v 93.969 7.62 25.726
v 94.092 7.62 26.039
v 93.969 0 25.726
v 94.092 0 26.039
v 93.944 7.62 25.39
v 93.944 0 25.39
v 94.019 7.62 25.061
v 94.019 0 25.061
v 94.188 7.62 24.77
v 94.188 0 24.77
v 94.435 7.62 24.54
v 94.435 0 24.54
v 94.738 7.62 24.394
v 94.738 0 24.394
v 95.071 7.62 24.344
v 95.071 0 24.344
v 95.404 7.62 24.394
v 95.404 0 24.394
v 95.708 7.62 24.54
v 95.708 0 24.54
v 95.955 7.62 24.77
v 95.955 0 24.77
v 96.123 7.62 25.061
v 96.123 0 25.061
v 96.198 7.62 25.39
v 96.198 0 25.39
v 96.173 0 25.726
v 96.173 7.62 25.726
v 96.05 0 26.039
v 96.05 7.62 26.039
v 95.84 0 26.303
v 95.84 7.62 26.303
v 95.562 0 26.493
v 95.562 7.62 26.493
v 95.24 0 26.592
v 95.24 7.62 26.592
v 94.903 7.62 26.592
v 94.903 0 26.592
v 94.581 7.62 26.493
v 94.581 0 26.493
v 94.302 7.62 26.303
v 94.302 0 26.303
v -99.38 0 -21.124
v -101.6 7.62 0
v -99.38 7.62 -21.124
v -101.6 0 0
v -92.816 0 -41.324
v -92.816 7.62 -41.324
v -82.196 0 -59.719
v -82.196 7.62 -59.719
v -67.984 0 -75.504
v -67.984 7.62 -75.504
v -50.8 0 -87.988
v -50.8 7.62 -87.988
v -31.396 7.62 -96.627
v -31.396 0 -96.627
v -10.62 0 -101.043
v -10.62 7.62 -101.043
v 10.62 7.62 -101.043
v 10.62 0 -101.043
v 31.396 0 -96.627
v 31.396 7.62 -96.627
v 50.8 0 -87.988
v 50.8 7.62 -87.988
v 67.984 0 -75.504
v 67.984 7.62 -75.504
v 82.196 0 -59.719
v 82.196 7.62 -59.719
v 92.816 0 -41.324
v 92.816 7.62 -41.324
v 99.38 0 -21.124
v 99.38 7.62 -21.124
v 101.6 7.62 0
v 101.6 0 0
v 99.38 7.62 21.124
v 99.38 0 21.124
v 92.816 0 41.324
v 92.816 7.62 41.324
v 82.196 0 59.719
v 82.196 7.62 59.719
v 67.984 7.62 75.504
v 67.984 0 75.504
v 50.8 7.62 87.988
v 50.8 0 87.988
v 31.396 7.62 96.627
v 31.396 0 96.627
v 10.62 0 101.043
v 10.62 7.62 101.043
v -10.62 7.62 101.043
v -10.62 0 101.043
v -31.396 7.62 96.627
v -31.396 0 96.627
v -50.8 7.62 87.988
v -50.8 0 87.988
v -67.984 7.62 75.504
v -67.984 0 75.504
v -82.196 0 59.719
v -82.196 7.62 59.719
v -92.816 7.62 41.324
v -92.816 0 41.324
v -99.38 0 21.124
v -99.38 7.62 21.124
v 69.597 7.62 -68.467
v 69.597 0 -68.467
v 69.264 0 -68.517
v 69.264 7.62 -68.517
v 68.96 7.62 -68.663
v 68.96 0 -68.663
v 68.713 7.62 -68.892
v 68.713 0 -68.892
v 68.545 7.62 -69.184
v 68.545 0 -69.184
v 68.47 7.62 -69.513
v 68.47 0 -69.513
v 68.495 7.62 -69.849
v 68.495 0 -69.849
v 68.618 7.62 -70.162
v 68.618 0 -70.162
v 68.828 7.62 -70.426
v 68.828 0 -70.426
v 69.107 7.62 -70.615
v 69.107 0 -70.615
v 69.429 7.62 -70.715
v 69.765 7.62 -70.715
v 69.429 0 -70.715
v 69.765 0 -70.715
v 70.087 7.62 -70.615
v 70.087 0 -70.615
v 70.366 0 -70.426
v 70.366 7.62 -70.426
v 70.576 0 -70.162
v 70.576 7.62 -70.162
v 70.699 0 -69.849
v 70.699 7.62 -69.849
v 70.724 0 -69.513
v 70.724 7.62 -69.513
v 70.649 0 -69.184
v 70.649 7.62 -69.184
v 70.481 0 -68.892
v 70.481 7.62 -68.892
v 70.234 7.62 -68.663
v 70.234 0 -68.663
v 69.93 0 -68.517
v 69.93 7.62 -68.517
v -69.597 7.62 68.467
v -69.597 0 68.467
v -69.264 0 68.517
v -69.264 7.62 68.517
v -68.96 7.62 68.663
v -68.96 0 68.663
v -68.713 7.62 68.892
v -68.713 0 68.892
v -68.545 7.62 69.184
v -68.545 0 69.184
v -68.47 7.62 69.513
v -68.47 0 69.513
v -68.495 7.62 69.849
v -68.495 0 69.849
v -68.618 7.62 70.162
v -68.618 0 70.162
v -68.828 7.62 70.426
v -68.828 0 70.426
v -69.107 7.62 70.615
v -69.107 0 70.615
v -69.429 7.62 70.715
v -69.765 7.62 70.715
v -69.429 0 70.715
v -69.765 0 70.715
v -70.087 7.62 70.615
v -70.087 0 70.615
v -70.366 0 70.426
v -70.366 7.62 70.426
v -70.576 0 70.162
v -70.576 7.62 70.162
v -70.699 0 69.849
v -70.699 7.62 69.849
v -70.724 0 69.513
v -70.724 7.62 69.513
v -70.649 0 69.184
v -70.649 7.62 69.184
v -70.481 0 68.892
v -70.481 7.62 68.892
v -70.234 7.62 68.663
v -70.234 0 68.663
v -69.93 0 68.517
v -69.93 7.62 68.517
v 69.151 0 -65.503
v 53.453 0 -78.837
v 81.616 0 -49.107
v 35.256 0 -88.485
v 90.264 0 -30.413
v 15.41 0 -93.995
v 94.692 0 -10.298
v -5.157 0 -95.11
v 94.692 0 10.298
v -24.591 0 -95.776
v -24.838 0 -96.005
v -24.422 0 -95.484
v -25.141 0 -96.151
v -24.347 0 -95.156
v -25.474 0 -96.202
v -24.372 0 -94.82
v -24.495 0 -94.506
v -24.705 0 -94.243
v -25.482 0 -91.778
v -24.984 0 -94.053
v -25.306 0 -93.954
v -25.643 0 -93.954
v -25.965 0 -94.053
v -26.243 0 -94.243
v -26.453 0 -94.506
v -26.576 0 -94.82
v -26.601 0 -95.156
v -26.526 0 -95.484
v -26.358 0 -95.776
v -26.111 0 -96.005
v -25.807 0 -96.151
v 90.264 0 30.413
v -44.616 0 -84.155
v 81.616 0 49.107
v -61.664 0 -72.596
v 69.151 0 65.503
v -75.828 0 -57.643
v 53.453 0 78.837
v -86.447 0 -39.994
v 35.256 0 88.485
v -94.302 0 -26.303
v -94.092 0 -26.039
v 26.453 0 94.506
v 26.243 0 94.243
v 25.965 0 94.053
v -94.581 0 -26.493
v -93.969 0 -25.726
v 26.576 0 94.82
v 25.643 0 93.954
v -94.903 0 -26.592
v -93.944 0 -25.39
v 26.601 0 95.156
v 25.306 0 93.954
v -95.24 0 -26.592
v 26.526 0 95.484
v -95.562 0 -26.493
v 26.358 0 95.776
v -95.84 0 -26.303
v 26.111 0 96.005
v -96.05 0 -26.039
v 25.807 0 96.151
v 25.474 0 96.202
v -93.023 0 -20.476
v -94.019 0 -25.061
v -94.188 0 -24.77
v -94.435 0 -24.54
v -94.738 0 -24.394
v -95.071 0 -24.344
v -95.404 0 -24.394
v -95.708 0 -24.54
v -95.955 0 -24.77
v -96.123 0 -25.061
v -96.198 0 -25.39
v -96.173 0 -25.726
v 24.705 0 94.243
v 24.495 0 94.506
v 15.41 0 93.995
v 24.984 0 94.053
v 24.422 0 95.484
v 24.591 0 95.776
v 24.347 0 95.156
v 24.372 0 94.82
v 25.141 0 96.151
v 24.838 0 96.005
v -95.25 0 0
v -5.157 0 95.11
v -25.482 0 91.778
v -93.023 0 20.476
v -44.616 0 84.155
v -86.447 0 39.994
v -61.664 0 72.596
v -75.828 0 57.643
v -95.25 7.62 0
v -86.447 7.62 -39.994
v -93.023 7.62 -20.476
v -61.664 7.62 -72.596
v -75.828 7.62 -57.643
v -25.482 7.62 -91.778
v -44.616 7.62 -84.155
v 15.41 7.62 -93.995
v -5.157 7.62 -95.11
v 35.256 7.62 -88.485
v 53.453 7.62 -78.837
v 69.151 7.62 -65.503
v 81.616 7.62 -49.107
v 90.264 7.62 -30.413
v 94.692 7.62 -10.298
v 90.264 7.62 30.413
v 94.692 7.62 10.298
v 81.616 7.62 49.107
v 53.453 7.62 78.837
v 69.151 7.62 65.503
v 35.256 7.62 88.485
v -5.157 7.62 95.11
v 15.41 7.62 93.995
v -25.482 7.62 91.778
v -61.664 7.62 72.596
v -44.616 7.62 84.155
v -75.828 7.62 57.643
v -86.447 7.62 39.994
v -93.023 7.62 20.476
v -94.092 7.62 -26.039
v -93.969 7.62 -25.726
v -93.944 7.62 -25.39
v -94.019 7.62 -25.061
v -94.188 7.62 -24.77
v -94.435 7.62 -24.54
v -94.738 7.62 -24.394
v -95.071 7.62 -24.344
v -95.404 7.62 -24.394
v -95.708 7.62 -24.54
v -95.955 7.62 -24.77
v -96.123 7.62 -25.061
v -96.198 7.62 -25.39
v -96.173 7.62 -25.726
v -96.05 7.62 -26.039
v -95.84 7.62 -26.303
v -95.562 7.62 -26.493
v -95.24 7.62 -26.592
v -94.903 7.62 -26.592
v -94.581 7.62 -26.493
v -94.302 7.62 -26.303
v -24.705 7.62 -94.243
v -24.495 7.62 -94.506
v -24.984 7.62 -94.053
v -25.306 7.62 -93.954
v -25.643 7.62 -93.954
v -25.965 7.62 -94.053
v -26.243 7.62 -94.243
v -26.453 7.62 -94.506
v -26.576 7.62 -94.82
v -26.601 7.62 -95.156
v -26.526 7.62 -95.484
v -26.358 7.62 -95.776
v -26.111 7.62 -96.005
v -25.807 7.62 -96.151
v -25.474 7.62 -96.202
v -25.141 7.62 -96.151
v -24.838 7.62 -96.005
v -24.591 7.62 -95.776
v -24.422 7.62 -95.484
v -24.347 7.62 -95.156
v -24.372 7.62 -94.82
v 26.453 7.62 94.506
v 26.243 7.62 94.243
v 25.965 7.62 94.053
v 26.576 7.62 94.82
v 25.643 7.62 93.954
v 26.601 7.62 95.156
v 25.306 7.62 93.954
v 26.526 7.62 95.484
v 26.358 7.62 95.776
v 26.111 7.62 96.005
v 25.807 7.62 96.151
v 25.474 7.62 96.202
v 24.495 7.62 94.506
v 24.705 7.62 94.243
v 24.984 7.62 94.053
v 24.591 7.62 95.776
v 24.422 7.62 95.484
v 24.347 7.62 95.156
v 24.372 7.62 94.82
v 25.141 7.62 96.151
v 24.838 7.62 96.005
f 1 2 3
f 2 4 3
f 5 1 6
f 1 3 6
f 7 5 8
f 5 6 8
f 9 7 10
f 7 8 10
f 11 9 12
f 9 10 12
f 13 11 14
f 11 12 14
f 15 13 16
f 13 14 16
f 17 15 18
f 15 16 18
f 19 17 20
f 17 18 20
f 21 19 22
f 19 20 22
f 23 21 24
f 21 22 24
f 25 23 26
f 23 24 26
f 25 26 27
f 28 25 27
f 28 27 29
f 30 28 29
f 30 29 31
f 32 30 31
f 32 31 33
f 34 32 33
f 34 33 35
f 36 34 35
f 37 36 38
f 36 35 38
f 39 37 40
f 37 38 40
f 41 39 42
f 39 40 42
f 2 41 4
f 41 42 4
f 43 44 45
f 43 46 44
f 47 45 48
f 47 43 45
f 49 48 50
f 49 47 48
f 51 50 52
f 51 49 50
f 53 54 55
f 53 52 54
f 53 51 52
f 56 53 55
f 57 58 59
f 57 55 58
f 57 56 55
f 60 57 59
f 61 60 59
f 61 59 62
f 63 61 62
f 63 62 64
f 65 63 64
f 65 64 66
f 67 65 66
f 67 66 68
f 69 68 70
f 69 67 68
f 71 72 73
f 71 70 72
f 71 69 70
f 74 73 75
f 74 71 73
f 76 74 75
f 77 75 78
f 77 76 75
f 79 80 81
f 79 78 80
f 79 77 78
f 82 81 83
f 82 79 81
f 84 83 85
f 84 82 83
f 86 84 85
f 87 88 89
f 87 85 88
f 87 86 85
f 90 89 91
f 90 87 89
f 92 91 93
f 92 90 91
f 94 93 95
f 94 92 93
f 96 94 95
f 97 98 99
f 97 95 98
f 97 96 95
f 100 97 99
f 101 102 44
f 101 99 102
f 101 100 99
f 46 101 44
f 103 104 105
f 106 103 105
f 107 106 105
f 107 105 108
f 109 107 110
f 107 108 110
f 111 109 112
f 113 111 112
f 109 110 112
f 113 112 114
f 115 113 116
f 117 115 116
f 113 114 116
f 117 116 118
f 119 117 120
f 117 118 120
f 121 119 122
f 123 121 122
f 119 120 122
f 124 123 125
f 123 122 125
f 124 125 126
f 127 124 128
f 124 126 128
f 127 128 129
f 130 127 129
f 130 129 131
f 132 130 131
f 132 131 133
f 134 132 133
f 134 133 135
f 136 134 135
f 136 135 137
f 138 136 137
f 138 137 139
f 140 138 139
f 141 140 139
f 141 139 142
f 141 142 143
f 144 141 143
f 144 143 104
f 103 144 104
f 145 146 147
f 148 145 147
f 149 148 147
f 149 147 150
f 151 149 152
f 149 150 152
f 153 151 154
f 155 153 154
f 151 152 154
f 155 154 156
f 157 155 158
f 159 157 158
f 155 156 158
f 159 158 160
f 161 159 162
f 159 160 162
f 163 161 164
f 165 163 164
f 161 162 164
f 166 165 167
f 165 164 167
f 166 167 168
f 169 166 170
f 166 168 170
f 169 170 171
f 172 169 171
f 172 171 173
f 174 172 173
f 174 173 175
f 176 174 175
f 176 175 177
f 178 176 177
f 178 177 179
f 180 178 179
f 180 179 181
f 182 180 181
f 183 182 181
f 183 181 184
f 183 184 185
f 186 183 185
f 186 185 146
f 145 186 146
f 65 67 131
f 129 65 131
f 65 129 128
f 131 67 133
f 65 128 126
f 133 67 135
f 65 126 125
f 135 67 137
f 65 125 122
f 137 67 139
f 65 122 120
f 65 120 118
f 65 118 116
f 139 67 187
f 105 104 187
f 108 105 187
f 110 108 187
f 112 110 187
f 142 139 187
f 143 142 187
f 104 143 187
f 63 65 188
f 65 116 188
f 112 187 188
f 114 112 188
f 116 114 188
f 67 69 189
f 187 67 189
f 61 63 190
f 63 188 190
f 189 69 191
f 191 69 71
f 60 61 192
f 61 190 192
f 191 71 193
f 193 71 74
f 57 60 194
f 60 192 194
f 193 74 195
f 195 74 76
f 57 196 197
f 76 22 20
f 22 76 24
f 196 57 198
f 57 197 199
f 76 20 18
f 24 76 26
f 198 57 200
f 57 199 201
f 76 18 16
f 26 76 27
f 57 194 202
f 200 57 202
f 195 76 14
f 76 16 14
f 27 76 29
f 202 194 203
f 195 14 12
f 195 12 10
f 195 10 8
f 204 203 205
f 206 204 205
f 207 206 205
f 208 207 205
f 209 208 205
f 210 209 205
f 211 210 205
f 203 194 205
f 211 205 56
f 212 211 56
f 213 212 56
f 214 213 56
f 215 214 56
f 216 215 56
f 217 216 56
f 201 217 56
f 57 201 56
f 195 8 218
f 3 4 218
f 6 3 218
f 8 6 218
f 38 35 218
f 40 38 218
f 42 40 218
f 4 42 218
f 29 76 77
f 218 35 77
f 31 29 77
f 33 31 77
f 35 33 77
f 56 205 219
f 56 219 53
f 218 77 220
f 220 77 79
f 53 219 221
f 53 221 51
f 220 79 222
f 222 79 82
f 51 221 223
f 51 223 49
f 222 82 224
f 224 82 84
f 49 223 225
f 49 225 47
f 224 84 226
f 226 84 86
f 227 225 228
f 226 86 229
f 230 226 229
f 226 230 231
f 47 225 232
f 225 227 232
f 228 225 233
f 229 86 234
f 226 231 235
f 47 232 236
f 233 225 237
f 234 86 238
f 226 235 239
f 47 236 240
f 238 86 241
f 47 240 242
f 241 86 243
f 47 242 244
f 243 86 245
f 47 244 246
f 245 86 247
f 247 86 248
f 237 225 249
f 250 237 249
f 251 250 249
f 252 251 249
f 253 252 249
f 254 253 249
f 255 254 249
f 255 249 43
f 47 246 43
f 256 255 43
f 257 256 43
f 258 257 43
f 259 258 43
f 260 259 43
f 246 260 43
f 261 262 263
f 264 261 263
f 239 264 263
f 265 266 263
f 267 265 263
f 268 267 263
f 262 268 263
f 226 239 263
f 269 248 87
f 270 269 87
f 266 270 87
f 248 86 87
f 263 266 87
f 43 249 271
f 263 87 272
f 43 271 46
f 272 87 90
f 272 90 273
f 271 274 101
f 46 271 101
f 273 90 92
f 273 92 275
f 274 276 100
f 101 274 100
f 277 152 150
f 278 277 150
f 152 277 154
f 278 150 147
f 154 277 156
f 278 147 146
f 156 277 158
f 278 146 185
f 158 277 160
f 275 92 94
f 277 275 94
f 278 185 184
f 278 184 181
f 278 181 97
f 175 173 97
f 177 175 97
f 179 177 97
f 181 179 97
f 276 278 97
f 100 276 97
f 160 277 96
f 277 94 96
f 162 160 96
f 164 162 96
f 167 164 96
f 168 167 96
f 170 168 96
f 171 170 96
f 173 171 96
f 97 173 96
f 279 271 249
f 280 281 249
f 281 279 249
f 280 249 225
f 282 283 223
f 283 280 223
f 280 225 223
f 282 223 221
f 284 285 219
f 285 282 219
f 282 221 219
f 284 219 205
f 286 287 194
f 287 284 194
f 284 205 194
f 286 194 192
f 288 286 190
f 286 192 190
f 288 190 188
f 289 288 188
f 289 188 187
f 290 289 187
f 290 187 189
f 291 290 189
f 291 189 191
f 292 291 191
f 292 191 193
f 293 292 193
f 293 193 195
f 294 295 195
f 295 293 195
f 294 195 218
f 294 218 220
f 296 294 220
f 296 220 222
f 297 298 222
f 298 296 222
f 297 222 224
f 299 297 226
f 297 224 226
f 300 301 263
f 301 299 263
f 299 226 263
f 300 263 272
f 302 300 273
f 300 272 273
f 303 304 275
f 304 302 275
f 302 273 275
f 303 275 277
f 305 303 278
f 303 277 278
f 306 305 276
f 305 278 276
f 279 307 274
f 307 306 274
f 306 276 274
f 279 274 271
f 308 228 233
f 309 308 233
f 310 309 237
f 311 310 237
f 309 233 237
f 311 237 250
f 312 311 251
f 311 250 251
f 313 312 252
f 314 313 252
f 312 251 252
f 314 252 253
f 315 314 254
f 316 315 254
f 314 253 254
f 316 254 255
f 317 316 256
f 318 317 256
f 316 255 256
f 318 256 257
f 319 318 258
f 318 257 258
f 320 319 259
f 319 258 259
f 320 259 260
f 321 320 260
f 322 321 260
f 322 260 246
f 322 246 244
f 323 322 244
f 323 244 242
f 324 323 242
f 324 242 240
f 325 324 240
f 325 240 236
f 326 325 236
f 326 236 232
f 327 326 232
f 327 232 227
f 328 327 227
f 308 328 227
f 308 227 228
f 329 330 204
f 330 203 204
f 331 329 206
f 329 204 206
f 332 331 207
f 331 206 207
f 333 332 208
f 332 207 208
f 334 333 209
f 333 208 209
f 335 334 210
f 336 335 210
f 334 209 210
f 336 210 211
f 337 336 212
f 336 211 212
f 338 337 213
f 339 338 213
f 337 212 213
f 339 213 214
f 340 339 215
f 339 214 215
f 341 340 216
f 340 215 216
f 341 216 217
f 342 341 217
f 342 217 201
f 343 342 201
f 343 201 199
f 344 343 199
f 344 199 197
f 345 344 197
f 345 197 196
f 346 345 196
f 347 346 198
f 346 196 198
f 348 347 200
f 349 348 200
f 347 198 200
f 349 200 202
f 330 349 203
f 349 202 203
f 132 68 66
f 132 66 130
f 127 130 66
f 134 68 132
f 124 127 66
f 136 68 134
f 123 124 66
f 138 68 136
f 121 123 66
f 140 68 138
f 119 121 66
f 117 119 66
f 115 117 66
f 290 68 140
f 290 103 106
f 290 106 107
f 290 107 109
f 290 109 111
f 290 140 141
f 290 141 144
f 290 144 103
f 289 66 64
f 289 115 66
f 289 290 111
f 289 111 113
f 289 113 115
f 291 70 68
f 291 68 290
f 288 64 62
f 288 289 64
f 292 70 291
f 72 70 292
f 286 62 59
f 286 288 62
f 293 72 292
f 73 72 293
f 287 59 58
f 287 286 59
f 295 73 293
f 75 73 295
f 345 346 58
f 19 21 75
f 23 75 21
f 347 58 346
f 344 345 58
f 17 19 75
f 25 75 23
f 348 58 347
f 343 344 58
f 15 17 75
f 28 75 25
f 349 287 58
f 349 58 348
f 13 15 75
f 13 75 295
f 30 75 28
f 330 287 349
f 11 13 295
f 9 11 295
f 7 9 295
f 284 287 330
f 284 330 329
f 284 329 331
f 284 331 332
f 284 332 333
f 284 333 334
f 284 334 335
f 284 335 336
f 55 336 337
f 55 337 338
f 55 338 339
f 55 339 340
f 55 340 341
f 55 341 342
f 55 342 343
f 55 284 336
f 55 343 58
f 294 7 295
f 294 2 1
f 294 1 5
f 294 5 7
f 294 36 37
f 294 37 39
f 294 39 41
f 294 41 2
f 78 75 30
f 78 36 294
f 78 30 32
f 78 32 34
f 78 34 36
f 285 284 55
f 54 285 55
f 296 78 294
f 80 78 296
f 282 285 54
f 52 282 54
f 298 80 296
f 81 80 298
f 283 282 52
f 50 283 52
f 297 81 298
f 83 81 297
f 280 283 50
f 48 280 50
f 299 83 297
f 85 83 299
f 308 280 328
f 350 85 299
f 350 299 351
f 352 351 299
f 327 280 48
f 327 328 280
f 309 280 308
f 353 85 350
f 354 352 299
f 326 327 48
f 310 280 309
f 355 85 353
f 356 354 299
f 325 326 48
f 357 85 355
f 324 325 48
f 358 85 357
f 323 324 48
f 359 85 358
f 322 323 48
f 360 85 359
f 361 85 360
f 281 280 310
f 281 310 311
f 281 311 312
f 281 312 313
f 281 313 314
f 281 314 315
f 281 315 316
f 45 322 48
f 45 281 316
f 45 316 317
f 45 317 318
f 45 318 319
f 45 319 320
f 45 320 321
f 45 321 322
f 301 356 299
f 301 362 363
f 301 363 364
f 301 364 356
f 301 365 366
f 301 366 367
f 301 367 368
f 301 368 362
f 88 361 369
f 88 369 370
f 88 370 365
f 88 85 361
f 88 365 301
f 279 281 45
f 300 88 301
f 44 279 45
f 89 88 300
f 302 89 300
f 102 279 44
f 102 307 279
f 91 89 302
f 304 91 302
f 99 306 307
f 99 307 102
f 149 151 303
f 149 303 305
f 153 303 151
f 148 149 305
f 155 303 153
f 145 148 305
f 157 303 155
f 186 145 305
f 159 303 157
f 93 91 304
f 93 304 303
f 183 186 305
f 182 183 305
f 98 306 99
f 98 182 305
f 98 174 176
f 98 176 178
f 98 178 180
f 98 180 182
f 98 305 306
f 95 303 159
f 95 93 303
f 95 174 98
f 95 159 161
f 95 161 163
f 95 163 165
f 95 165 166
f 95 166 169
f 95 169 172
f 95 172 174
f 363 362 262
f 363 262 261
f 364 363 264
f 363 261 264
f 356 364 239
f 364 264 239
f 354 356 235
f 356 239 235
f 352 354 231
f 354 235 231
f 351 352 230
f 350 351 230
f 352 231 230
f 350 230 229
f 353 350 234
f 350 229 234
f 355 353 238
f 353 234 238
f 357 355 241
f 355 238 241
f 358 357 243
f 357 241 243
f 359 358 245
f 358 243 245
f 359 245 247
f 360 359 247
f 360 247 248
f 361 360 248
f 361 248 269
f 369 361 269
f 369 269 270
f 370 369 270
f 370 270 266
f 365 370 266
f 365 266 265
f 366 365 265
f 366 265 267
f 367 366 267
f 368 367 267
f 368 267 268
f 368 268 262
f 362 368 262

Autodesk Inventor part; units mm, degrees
ref_plane "YZ Plane" through (0, 0, 0) normal (1, 0, 0) x (0, 1, 0)
ref_plane "XZ Plane" through (0, 0, 0) normal (0, 1, 0) x (-1, 0, 0)
ref_plane "XY Plane" through (0, 0, 0) normal (0, 0, 1) x (1, 0, 0)
sketch "Sketch1" plane through (0, 0, 0) normal (0, 1, 0) x (-1, 0, 0)
  circle A0 centre (0, 0) radius 101.6
  circle A1 centre (0, 0) radius 95.25
  dimension "d0" = 203.2
  dimension "d1" = 190.5
extrude "Extrusion1" add sketch "Sketch1" along normal blind 7.62
sketch "Sketch2" plane through (0, 7.62, 0) normal (0, 1, 0) x (1, 0, 0)
  line L0 (0, 0) -> (69.597, 69.597) construction
  line L1 (0, 0) -> (98.425, 0) construction
  point P0 (71.1594, 93.9158)
  dimension "d4" = 98.425
  dimension "d5" = 45
hole "Hole1" at (69.597, 7.62, -69.597) at (71.1594, 7.62, -93.9158) direction (0, -1, 0) diameter 2.2606 end through all
pattern_circular "Circular Pattern1" count 6 over 360 about axis through (0, 0, 0) along (0, 1, 0) of "Hole1"
properties part number "4K sheild rim" material "Brass, Soft Yellow"
